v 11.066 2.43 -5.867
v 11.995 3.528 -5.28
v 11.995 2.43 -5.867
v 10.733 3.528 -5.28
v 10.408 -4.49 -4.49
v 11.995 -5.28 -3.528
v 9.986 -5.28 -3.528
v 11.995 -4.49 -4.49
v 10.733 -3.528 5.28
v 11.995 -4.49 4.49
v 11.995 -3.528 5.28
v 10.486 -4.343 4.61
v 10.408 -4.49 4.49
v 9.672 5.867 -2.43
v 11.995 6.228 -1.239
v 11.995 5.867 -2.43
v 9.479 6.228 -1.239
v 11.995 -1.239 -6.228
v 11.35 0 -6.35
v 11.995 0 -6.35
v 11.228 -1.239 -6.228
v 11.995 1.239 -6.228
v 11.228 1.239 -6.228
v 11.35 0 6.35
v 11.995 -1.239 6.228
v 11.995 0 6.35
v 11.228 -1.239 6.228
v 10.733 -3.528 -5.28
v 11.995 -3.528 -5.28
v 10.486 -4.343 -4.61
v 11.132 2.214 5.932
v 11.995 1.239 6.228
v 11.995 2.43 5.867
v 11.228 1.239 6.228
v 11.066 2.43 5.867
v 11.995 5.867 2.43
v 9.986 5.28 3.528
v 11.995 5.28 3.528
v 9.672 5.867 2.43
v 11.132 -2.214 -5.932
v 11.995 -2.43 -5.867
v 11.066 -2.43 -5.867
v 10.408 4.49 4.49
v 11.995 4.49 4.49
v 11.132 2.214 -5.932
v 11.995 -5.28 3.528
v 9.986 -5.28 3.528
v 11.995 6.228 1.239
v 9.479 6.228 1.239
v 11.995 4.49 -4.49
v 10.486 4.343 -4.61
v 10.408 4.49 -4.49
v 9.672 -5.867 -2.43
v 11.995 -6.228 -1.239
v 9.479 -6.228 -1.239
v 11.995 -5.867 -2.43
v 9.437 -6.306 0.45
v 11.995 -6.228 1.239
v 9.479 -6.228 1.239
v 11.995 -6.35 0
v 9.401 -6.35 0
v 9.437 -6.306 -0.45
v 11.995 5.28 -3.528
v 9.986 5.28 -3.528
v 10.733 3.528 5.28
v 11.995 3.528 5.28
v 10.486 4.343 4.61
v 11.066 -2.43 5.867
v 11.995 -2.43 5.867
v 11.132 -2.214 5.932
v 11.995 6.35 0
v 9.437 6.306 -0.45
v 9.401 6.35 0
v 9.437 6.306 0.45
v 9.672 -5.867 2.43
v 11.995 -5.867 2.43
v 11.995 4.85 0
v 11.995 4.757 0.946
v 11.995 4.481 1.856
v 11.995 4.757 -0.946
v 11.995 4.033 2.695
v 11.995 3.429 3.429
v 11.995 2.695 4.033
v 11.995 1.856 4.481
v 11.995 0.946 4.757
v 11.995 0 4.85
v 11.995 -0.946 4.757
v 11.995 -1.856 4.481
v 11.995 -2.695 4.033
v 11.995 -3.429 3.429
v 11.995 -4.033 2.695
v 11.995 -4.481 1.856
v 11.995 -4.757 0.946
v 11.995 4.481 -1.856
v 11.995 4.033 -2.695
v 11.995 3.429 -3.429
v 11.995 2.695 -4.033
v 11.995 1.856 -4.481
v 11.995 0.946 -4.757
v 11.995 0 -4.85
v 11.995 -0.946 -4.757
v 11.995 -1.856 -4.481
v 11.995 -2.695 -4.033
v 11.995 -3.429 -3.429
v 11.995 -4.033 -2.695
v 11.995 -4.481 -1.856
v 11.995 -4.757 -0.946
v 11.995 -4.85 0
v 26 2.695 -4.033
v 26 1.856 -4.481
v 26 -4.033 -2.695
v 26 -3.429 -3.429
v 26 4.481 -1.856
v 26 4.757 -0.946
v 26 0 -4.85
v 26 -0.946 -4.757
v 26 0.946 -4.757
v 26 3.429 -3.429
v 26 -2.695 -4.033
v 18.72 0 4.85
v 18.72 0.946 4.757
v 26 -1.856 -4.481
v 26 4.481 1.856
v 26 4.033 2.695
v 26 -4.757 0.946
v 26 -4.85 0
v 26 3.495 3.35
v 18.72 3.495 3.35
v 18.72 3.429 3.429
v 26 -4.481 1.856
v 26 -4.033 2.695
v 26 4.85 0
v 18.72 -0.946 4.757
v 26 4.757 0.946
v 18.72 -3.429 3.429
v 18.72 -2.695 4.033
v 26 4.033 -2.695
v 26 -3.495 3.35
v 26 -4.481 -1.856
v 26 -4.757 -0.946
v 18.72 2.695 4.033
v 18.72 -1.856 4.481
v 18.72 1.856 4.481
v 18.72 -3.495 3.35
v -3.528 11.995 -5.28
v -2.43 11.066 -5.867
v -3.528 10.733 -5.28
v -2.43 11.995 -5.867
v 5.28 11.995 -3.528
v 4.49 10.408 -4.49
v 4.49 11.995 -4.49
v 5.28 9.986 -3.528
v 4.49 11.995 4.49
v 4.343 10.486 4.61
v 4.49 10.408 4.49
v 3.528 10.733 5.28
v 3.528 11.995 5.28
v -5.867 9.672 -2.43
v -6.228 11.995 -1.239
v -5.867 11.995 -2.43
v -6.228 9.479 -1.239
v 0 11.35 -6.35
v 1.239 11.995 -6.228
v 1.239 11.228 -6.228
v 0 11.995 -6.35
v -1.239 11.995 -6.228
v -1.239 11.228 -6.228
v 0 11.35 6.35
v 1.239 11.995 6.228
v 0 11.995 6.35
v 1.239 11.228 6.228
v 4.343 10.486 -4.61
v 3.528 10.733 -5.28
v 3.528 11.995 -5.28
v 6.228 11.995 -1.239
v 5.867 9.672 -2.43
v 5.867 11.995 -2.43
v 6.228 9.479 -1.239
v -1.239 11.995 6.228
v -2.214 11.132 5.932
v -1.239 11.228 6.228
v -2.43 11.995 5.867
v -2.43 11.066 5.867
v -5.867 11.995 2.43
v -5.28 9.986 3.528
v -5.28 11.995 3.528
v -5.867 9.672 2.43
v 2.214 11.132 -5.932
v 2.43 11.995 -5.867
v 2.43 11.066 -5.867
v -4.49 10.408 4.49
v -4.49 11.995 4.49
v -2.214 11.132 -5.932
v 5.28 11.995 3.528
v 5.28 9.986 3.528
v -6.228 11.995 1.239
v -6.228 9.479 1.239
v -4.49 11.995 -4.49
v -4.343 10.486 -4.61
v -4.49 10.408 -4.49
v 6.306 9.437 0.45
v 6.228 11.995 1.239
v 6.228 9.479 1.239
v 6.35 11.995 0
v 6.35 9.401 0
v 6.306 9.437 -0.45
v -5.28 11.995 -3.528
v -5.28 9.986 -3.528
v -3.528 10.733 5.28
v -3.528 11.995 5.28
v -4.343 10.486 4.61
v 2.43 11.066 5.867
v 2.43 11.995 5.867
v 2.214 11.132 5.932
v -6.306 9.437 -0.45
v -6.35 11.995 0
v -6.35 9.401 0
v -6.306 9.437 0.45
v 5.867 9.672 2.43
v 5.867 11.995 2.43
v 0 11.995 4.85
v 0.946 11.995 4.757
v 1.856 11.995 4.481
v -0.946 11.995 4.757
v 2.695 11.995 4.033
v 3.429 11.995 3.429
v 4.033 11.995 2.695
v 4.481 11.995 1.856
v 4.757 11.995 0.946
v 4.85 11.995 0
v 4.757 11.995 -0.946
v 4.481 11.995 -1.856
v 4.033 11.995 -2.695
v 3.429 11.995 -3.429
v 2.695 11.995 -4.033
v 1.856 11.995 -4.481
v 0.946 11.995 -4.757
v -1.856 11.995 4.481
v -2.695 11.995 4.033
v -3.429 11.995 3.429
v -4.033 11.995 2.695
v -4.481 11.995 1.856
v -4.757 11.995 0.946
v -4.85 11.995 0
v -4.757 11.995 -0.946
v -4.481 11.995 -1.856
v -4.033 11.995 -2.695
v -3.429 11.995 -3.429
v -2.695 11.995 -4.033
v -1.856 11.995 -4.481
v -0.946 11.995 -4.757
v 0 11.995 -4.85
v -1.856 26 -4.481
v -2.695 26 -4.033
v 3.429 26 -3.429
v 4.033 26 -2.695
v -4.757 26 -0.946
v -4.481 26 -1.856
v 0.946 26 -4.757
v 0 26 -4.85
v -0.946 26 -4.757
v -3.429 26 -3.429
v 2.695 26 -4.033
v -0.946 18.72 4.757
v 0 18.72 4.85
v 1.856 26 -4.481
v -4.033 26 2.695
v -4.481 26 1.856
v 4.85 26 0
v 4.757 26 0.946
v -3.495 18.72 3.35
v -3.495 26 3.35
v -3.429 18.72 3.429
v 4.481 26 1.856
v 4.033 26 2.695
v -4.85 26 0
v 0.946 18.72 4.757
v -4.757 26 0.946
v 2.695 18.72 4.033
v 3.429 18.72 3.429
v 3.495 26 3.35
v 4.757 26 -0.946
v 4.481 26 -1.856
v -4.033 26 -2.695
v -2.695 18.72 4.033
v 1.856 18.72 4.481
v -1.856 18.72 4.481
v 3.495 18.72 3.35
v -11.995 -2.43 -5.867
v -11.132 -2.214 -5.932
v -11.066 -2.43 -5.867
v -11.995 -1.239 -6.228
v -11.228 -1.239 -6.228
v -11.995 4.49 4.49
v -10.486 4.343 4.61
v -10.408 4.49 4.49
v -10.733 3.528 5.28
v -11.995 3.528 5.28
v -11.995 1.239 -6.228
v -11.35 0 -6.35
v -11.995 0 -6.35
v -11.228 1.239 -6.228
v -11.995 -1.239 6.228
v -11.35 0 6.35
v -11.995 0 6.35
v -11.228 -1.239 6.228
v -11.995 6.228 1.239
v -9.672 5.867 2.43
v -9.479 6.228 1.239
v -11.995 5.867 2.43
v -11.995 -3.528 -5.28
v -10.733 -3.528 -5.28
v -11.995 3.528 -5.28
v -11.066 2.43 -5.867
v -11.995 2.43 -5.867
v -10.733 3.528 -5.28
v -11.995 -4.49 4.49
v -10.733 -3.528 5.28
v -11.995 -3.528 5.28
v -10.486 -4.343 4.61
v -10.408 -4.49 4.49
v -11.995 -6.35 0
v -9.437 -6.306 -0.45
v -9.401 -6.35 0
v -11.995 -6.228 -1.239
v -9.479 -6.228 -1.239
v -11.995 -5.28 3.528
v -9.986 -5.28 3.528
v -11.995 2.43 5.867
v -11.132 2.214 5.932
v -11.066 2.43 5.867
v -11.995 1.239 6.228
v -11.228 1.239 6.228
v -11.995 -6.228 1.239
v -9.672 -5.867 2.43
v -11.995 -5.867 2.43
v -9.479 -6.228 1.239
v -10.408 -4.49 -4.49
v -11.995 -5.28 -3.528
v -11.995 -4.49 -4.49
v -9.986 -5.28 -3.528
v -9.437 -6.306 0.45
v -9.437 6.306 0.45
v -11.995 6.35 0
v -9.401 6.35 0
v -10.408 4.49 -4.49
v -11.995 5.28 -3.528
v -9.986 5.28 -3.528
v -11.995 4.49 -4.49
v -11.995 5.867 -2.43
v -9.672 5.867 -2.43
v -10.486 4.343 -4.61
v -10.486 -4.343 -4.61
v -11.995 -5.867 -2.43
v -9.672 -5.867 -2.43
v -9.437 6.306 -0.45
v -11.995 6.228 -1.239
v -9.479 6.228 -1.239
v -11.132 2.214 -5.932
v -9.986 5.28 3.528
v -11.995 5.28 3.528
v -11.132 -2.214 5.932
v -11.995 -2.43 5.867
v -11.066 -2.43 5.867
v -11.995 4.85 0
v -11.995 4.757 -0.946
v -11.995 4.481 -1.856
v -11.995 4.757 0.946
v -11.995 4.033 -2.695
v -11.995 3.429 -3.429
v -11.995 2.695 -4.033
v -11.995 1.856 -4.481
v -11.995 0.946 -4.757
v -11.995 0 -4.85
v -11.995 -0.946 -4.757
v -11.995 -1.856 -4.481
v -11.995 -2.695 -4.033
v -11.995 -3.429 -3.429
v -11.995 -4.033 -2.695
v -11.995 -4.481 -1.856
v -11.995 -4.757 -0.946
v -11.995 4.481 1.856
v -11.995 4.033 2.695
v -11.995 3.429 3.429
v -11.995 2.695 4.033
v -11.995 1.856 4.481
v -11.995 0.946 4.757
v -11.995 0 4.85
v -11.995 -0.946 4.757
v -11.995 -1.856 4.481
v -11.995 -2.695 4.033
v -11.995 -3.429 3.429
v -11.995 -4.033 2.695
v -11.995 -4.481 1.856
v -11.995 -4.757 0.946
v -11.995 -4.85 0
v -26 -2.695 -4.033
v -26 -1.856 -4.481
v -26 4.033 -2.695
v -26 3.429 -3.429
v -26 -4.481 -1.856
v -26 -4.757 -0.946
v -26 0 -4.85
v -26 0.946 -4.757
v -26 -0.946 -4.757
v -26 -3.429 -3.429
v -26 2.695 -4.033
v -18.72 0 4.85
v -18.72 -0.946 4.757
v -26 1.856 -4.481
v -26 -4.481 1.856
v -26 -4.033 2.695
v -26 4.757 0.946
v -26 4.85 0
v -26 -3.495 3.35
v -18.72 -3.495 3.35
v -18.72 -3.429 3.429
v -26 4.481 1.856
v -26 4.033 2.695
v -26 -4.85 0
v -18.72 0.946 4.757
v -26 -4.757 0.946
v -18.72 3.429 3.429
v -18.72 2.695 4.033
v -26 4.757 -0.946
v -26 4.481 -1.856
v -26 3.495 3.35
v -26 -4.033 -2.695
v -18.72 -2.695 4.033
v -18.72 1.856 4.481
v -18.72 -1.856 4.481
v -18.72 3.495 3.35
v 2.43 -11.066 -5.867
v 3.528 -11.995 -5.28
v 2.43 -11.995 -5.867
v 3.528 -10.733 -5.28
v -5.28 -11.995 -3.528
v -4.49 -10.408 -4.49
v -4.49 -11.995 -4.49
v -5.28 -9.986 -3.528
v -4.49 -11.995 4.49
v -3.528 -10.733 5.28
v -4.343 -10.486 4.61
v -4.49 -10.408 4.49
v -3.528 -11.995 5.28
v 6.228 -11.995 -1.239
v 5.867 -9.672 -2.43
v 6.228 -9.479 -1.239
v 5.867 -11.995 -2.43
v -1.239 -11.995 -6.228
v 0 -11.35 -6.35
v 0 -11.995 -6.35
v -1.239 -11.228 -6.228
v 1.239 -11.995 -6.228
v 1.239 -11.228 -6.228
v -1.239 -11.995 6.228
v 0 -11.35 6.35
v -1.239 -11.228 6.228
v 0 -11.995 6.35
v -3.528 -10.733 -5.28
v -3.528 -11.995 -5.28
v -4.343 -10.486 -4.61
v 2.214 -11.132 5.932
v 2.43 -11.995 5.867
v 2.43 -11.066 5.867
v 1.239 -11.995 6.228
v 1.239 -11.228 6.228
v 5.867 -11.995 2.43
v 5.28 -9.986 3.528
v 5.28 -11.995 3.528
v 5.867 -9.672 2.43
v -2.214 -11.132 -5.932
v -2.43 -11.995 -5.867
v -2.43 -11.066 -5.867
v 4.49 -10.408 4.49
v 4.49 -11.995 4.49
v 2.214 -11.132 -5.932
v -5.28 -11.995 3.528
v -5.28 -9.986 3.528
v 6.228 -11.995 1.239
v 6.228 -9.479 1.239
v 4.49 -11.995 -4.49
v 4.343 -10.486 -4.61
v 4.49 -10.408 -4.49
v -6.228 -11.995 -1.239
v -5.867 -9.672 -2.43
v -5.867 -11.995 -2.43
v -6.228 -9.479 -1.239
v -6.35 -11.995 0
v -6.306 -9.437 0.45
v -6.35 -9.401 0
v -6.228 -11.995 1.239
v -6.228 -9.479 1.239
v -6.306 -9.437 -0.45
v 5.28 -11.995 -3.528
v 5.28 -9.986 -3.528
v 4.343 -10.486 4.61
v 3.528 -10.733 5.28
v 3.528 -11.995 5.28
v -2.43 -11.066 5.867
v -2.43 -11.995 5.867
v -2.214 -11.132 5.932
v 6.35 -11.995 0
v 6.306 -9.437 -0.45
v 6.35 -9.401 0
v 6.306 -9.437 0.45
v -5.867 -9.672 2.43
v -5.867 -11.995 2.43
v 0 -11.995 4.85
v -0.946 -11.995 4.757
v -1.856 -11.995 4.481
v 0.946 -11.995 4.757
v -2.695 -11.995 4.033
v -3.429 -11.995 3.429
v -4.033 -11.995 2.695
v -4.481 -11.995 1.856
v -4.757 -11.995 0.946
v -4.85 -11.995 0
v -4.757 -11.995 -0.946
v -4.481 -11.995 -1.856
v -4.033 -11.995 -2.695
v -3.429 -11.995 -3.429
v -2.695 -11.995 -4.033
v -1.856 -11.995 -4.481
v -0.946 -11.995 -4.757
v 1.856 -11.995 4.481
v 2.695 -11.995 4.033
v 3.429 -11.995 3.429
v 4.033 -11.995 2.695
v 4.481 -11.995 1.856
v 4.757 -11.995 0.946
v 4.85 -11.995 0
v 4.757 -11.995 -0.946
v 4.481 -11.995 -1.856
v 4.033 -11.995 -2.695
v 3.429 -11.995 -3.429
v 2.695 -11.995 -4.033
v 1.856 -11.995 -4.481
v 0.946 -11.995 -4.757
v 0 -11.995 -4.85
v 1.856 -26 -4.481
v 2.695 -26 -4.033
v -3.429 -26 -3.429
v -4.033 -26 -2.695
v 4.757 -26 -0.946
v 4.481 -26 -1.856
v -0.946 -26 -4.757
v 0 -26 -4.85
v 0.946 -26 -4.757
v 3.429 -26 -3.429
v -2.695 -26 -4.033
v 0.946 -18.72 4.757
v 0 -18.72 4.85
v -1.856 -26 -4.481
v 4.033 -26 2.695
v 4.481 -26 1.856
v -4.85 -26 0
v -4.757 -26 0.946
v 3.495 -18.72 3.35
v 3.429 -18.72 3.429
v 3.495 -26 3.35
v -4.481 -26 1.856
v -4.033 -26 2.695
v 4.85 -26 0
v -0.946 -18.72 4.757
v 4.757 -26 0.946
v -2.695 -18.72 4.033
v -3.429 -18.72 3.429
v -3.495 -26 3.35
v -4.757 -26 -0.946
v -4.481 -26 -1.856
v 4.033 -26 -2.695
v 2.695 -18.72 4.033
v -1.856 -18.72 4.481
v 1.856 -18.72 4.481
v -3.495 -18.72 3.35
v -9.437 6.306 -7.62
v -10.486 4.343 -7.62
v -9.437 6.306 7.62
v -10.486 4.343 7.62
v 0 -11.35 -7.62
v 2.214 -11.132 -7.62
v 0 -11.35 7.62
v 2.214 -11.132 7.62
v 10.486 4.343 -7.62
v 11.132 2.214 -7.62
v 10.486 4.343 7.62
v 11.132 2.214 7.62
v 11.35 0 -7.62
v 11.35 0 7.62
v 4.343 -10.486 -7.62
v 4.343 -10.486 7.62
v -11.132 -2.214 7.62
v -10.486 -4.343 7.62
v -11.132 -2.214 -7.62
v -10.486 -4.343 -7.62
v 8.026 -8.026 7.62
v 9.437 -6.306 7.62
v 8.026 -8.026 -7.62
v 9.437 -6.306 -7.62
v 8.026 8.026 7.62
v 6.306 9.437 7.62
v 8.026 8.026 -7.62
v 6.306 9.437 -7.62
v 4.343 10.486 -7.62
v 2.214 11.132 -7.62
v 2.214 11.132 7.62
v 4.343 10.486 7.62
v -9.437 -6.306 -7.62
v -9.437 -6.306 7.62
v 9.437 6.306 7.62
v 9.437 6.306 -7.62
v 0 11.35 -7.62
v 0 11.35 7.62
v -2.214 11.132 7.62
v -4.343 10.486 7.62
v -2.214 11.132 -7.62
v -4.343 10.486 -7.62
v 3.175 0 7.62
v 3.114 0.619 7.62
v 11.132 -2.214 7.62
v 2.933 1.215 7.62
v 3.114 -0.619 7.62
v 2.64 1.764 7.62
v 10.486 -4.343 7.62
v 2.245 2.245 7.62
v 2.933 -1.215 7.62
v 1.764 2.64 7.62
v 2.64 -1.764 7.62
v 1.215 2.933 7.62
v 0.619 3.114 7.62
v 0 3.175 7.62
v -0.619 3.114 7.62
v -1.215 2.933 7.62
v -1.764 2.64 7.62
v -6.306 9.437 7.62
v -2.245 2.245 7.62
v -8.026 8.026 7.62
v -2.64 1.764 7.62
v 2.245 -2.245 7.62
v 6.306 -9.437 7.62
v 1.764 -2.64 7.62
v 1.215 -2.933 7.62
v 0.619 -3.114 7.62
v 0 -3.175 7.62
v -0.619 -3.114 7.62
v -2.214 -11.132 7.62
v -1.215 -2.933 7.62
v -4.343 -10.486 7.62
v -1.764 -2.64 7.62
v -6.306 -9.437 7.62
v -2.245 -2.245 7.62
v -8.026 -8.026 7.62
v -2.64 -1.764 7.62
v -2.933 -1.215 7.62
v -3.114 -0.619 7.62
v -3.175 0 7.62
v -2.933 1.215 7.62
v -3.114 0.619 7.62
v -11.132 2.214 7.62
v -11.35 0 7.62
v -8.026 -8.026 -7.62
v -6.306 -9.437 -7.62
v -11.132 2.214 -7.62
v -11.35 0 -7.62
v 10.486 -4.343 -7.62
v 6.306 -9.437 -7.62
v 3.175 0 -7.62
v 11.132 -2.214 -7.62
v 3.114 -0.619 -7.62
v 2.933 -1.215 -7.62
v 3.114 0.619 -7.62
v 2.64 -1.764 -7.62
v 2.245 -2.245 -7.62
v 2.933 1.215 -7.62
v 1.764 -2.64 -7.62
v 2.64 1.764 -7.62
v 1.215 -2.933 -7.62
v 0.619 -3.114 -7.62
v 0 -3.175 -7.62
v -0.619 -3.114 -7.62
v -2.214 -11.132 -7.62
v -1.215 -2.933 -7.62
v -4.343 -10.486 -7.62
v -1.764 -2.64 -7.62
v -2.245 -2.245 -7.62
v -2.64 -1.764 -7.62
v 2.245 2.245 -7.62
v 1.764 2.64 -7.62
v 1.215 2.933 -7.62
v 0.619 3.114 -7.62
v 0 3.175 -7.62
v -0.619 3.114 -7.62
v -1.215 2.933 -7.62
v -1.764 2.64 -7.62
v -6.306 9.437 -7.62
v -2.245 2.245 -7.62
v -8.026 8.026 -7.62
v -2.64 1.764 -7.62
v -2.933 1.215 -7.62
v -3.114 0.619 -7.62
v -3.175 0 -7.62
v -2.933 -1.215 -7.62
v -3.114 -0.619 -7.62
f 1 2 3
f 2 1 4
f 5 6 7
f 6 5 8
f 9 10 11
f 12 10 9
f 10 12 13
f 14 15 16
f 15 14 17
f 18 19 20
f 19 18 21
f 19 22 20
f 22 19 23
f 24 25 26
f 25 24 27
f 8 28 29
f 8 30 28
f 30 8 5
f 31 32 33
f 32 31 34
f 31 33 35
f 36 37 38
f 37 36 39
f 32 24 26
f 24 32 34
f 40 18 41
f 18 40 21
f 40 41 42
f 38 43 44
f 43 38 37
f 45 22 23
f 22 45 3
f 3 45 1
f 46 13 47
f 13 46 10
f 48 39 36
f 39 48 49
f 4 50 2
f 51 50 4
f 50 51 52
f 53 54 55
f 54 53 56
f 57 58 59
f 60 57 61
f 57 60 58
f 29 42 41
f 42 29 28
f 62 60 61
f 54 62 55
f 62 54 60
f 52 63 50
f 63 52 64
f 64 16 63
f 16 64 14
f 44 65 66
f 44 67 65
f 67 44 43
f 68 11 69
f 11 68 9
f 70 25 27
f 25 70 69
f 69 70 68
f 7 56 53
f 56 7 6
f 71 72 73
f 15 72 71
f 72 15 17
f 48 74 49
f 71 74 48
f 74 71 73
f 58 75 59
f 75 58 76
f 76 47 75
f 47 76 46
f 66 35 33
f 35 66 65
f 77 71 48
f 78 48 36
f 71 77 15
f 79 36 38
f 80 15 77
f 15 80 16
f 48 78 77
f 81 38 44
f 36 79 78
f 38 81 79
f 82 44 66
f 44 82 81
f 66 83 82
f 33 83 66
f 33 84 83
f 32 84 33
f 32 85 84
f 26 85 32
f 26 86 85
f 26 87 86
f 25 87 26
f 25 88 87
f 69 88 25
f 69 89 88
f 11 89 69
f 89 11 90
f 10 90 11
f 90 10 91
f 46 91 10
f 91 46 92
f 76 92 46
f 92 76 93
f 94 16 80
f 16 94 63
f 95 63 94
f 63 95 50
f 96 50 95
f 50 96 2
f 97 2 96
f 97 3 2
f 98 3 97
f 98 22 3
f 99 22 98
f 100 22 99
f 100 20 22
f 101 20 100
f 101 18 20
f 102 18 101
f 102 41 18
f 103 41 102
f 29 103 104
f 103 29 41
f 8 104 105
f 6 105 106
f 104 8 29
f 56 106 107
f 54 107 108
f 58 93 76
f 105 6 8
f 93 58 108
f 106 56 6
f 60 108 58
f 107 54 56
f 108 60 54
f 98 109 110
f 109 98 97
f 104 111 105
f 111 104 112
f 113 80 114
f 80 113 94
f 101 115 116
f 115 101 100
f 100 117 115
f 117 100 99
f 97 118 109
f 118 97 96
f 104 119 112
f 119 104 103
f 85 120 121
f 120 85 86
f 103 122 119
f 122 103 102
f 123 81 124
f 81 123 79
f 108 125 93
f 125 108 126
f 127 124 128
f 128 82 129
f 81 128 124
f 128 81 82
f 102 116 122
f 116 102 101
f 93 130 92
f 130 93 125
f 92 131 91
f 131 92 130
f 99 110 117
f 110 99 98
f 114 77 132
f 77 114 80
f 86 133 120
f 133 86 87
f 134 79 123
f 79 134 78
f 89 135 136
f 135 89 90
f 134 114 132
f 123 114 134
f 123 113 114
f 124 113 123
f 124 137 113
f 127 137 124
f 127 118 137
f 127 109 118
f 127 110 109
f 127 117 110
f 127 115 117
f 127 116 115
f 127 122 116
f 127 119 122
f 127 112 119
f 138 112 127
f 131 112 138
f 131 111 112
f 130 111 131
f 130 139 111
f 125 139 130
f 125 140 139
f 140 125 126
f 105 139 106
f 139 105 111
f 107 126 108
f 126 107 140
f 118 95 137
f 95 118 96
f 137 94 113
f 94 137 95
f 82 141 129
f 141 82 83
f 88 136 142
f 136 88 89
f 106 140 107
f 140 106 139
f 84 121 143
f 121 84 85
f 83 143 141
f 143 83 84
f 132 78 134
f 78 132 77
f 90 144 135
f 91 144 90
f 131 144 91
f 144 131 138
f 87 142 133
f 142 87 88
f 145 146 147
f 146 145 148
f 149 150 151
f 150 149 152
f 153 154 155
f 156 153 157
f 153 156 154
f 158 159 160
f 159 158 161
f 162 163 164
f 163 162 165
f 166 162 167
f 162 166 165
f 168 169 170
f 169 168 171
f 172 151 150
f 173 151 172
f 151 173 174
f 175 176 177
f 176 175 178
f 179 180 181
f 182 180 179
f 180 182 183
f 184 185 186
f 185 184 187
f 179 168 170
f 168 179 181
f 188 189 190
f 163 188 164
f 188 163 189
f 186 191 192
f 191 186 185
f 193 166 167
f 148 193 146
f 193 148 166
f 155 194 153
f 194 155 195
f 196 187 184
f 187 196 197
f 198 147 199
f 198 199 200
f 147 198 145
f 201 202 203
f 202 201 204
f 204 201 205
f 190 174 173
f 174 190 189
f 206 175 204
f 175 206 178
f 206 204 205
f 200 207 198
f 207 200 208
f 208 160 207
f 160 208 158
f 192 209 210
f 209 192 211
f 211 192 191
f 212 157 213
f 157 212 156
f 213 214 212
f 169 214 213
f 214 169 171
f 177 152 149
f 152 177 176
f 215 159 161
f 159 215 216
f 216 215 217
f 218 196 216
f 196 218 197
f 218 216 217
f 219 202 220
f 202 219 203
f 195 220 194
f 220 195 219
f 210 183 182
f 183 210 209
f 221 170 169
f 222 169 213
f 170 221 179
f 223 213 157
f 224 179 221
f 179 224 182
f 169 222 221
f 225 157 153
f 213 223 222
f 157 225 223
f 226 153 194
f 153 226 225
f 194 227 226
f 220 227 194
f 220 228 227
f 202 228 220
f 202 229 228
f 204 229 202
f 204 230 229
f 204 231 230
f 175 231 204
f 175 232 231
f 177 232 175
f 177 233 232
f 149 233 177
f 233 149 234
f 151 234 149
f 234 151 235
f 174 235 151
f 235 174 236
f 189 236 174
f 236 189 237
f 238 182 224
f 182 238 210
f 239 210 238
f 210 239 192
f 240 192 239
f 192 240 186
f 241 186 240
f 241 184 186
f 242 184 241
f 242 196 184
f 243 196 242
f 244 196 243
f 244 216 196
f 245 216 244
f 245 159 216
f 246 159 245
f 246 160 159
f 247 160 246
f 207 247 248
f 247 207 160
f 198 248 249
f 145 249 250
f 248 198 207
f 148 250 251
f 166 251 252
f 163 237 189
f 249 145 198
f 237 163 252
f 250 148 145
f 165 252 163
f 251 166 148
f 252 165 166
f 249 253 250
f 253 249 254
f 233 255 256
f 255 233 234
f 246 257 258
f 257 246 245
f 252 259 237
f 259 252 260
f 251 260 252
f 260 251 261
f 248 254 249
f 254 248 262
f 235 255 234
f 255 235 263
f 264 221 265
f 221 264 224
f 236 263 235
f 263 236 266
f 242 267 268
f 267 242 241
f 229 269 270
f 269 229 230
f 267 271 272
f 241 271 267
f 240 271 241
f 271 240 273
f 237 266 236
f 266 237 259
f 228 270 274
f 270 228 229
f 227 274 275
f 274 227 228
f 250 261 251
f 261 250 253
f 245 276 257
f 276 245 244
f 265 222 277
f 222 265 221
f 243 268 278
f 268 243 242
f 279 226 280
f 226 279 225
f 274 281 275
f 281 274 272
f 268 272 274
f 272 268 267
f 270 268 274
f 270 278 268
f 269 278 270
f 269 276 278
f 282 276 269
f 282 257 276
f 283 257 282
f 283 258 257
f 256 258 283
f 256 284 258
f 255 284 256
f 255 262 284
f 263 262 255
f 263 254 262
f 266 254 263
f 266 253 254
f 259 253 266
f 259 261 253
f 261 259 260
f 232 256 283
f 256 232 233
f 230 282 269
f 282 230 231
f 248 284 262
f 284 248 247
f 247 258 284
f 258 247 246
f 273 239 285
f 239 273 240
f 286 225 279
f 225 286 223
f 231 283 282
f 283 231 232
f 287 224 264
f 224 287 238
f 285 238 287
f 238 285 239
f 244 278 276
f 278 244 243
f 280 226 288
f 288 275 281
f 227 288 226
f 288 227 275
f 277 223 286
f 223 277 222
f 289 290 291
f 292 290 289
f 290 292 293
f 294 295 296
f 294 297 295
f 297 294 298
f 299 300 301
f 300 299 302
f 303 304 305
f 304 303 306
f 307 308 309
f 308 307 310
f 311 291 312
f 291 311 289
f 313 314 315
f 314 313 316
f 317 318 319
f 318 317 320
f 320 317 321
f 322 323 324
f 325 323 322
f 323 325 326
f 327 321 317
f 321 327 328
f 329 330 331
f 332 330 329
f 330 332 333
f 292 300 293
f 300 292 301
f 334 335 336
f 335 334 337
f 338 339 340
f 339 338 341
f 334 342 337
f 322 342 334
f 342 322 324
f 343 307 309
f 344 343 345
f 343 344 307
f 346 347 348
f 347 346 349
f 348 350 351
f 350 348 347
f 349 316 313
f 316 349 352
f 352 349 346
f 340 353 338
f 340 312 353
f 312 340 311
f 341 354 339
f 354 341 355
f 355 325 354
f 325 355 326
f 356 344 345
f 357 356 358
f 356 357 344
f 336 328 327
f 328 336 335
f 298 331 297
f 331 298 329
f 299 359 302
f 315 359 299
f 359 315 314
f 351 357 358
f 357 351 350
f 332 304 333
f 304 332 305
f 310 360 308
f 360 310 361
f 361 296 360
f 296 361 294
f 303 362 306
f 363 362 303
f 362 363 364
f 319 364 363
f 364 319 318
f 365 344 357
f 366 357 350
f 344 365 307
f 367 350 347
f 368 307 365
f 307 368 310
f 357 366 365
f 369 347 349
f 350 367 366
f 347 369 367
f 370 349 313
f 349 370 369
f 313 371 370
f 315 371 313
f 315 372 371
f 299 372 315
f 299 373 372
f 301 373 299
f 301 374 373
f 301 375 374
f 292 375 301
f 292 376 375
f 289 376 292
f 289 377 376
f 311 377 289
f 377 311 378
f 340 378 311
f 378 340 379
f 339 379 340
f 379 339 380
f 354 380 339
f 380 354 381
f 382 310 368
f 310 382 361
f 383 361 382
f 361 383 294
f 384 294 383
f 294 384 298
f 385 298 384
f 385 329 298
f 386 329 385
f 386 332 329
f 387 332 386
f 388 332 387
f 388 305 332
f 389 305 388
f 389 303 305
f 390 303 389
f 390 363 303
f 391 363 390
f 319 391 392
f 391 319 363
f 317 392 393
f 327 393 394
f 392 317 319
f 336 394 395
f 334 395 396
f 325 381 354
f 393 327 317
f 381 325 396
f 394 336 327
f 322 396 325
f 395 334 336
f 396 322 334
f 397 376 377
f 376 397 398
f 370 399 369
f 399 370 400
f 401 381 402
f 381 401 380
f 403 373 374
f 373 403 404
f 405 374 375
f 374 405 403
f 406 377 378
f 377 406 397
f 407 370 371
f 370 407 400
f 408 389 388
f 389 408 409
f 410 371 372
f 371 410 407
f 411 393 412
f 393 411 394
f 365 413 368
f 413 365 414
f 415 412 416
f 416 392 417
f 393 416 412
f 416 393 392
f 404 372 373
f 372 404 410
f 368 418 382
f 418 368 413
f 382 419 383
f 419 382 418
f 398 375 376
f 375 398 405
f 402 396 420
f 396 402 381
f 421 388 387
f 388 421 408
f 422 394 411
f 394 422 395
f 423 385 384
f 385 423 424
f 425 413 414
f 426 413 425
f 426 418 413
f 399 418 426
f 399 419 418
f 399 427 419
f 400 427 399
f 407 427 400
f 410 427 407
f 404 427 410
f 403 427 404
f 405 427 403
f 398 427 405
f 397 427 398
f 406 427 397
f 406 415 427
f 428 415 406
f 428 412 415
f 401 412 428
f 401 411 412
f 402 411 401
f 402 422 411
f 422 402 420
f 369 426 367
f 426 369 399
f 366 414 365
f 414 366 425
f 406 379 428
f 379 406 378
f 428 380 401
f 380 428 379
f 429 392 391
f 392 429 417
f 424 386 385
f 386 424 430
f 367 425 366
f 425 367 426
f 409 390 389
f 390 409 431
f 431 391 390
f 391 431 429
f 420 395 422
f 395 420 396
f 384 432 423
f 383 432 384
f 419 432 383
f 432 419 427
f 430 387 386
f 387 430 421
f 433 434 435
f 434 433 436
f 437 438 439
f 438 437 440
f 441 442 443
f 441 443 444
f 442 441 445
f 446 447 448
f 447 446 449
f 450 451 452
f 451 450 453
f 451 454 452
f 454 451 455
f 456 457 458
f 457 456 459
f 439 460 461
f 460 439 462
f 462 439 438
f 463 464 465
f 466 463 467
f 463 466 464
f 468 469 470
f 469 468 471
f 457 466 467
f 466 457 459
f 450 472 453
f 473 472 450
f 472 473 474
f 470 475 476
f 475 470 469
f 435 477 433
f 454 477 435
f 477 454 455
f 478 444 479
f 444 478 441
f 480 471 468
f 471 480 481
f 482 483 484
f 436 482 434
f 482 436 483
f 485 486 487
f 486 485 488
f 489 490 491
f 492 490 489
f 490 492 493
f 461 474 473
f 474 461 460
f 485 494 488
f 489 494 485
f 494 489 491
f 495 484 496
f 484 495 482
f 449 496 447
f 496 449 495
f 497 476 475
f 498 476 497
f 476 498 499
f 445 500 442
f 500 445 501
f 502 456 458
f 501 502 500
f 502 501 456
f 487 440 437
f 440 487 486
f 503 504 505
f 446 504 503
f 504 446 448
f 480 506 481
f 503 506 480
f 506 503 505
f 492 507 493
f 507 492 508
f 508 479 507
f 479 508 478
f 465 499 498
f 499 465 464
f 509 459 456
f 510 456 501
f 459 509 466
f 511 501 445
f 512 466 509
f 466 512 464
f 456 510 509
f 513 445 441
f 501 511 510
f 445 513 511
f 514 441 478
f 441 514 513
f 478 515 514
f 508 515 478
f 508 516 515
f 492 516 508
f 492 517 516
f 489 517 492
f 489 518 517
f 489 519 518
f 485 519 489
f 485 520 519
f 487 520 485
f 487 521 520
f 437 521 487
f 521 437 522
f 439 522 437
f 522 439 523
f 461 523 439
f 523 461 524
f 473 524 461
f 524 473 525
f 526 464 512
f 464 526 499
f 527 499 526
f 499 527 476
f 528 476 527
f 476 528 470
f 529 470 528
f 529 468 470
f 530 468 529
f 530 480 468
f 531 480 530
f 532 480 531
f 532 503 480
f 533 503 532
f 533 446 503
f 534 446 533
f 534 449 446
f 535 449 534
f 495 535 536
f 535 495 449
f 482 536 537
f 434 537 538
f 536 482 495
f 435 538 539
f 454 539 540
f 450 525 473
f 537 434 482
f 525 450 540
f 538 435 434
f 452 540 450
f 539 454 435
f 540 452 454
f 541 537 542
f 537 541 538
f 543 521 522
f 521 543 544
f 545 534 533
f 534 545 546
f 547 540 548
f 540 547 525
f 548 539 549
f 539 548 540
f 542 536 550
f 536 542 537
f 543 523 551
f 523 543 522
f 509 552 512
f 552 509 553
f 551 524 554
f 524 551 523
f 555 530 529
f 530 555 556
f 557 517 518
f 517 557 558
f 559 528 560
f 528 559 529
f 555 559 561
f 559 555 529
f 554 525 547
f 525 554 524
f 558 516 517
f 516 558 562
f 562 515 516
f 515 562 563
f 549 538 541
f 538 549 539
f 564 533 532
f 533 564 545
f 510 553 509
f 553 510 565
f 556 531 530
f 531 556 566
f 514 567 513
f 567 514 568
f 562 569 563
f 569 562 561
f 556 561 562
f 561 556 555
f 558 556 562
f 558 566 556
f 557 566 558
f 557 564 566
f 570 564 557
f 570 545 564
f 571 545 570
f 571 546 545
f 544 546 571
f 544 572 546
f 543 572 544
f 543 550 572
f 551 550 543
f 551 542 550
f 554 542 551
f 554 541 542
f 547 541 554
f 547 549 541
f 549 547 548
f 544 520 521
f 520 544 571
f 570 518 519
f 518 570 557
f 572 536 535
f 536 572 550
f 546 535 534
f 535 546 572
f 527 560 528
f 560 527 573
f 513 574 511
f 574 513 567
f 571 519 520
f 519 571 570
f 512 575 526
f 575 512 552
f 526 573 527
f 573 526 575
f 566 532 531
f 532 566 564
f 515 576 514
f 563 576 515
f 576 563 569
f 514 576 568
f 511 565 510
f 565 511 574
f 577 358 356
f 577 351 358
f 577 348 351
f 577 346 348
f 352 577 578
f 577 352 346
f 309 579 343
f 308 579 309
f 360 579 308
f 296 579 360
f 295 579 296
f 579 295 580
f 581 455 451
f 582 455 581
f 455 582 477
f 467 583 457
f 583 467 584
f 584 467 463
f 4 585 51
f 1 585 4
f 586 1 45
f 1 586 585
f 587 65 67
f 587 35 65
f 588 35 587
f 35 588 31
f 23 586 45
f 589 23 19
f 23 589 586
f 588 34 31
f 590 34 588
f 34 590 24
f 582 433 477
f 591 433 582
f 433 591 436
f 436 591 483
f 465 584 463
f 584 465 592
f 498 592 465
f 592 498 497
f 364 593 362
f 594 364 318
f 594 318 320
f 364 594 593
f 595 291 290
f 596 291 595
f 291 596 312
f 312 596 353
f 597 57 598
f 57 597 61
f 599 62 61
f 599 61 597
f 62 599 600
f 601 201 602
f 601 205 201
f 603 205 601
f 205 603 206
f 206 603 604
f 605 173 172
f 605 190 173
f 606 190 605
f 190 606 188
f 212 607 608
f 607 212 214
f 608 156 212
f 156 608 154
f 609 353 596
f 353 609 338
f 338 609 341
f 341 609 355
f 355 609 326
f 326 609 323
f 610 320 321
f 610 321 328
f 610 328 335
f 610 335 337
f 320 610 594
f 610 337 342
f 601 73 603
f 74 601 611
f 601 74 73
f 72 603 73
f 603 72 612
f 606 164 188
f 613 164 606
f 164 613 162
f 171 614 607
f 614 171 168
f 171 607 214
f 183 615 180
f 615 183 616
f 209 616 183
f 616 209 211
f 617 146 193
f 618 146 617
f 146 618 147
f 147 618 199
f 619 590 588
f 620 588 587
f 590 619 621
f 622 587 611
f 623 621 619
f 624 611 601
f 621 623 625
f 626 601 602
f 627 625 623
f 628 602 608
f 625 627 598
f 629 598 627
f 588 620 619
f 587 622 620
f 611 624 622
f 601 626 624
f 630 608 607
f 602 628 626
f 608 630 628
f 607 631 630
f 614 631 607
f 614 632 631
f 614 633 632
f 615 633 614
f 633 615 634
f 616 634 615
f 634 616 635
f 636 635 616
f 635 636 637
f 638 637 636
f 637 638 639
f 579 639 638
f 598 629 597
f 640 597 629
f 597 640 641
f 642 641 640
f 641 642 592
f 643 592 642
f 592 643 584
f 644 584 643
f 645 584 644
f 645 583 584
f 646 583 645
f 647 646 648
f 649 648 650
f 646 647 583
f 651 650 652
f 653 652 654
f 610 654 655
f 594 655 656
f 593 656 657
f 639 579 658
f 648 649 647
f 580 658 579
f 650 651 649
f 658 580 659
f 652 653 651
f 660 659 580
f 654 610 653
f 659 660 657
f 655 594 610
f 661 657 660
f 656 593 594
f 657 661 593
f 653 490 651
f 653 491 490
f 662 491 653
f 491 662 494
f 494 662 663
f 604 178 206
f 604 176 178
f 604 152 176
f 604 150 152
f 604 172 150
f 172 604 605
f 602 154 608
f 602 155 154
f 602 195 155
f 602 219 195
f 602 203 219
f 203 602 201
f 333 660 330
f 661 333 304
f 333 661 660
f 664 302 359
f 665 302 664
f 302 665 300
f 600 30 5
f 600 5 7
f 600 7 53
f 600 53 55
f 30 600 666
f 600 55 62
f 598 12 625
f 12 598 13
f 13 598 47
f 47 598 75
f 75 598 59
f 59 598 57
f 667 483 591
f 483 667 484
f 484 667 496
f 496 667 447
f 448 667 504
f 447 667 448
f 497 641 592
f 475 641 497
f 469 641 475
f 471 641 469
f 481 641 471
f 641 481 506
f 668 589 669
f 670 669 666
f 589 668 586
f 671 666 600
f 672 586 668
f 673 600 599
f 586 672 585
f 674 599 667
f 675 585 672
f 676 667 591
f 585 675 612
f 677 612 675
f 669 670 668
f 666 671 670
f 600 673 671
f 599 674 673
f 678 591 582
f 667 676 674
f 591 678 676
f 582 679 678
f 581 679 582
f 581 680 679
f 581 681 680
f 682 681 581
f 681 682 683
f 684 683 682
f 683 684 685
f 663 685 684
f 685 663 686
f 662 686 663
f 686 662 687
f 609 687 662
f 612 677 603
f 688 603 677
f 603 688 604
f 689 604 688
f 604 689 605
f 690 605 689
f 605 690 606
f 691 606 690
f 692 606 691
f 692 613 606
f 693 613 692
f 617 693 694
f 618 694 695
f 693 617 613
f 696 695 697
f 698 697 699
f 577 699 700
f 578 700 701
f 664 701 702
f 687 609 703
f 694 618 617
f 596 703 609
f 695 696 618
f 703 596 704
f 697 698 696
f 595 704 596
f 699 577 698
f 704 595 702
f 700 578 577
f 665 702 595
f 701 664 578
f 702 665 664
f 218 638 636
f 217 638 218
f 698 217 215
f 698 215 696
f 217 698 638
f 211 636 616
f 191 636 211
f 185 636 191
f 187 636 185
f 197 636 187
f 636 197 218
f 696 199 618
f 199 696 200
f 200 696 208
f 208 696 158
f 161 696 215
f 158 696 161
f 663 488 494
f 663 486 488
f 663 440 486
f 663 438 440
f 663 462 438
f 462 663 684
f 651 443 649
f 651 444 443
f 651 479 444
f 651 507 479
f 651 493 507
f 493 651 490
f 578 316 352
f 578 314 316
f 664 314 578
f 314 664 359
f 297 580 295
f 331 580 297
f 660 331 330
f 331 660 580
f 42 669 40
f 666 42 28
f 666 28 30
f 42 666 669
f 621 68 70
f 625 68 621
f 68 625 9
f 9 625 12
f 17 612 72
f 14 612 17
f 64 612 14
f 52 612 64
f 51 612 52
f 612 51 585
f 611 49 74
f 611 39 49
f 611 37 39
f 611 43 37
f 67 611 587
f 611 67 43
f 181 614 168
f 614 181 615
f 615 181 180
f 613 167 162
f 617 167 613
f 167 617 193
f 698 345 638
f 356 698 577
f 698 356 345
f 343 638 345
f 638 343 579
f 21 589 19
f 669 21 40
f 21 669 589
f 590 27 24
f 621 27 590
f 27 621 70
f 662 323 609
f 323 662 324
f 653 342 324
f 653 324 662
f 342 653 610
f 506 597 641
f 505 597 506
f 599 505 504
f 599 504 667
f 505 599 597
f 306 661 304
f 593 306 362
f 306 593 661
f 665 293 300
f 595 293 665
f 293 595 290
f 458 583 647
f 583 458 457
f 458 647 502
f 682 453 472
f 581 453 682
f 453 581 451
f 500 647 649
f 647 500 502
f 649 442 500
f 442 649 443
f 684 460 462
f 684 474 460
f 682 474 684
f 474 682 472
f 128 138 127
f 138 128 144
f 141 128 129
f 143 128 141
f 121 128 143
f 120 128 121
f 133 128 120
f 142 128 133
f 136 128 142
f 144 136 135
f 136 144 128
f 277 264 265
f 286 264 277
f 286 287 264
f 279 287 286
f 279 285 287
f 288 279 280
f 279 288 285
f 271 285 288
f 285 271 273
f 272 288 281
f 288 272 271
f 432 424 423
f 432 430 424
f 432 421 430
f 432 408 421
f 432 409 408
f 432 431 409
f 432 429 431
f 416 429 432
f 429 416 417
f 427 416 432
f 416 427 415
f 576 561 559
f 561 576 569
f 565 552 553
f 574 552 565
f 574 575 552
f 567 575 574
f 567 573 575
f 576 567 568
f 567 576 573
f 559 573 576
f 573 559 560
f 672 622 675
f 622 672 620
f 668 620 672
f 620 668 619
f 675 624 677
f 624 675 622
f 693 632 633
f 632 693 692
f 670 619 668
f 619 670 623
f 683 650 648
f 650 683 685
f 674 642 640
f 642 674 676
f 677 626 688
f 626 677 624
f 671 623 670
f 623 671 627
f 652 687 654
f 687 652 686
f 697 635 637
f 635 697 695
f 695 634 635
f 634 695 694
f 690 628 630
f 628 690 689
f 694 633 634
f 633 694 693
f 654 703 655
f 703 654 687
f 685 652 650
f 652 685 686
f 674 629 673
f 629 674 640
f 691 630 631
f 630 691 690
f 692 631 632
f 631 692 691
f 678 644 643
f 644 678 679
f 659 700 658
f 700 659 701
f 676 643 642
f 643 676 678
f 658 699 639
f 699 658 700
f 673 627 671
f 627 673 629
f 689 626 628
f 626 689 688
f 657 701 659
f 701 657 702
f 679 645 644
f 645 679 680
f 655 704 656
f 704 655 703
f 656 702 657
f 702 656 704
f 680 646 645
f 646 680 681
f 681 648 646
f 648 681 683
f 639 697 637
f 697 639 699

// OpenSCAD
$fn = 32;

// ----------------------------------------------------------------------
// Cardan cross: 52 mm span, 12.7 mm trunnions
// ----------------------------------------------------------------------

// --- parameters (mm) ---
journal_d = 12.7;         // trunnion diameter
arm_len = 26;             // trunnion length from the centre
step_r = 4.32;            // step position from the centre
step_d = 9.7;             // journal diameter after the step
hub_d = 22.7;             // hub diameter
hub_h = 15.24;            // hub height
bore_d = 6.35;            // hub bore
flat_d = 1.5;             // depth of the journal flat
flat_len = 7.28;          // length of the journal flat

difference() {
  union() {
    /* hub along the joint axis */
    cylinder(h = hub_h, d = hub_d, center = true);
    for (a = [0 : 90 : 270]) rotate([0, 0, a]) {
      /* trunnion, sunk into the hub */
      translate([hub_d / 4, 0, 0]) rotate([0, 90, 0]) cylinder(h = step_r + 2, d = journal_d);
      /* stepped journal out to the tip */
      translate([step_r - 0.5, 0, 0]) rotate([0, 90, 0]) cylinder(h = arm_len + 0.5 - step_r, d = step_d);
    }
  }
  /* lubrication bore through the hub, 2.5 mm clear on both sides */
  translate([0, 0, -hub_h / 2 - 2.5]) cylinder(h = hub_h + 5, d = bore_d);
  /* machined flat on each journal tip */
  for (a = [0 : 90 : 270]) rotate([0, 0, a]) {
    translate([arm_len - flat_len, -step_d, step_d / 2 - flat_d]) cube([flat_len + 0.5, 2 * step_d, flat_d + 2.5]);
  }
}
